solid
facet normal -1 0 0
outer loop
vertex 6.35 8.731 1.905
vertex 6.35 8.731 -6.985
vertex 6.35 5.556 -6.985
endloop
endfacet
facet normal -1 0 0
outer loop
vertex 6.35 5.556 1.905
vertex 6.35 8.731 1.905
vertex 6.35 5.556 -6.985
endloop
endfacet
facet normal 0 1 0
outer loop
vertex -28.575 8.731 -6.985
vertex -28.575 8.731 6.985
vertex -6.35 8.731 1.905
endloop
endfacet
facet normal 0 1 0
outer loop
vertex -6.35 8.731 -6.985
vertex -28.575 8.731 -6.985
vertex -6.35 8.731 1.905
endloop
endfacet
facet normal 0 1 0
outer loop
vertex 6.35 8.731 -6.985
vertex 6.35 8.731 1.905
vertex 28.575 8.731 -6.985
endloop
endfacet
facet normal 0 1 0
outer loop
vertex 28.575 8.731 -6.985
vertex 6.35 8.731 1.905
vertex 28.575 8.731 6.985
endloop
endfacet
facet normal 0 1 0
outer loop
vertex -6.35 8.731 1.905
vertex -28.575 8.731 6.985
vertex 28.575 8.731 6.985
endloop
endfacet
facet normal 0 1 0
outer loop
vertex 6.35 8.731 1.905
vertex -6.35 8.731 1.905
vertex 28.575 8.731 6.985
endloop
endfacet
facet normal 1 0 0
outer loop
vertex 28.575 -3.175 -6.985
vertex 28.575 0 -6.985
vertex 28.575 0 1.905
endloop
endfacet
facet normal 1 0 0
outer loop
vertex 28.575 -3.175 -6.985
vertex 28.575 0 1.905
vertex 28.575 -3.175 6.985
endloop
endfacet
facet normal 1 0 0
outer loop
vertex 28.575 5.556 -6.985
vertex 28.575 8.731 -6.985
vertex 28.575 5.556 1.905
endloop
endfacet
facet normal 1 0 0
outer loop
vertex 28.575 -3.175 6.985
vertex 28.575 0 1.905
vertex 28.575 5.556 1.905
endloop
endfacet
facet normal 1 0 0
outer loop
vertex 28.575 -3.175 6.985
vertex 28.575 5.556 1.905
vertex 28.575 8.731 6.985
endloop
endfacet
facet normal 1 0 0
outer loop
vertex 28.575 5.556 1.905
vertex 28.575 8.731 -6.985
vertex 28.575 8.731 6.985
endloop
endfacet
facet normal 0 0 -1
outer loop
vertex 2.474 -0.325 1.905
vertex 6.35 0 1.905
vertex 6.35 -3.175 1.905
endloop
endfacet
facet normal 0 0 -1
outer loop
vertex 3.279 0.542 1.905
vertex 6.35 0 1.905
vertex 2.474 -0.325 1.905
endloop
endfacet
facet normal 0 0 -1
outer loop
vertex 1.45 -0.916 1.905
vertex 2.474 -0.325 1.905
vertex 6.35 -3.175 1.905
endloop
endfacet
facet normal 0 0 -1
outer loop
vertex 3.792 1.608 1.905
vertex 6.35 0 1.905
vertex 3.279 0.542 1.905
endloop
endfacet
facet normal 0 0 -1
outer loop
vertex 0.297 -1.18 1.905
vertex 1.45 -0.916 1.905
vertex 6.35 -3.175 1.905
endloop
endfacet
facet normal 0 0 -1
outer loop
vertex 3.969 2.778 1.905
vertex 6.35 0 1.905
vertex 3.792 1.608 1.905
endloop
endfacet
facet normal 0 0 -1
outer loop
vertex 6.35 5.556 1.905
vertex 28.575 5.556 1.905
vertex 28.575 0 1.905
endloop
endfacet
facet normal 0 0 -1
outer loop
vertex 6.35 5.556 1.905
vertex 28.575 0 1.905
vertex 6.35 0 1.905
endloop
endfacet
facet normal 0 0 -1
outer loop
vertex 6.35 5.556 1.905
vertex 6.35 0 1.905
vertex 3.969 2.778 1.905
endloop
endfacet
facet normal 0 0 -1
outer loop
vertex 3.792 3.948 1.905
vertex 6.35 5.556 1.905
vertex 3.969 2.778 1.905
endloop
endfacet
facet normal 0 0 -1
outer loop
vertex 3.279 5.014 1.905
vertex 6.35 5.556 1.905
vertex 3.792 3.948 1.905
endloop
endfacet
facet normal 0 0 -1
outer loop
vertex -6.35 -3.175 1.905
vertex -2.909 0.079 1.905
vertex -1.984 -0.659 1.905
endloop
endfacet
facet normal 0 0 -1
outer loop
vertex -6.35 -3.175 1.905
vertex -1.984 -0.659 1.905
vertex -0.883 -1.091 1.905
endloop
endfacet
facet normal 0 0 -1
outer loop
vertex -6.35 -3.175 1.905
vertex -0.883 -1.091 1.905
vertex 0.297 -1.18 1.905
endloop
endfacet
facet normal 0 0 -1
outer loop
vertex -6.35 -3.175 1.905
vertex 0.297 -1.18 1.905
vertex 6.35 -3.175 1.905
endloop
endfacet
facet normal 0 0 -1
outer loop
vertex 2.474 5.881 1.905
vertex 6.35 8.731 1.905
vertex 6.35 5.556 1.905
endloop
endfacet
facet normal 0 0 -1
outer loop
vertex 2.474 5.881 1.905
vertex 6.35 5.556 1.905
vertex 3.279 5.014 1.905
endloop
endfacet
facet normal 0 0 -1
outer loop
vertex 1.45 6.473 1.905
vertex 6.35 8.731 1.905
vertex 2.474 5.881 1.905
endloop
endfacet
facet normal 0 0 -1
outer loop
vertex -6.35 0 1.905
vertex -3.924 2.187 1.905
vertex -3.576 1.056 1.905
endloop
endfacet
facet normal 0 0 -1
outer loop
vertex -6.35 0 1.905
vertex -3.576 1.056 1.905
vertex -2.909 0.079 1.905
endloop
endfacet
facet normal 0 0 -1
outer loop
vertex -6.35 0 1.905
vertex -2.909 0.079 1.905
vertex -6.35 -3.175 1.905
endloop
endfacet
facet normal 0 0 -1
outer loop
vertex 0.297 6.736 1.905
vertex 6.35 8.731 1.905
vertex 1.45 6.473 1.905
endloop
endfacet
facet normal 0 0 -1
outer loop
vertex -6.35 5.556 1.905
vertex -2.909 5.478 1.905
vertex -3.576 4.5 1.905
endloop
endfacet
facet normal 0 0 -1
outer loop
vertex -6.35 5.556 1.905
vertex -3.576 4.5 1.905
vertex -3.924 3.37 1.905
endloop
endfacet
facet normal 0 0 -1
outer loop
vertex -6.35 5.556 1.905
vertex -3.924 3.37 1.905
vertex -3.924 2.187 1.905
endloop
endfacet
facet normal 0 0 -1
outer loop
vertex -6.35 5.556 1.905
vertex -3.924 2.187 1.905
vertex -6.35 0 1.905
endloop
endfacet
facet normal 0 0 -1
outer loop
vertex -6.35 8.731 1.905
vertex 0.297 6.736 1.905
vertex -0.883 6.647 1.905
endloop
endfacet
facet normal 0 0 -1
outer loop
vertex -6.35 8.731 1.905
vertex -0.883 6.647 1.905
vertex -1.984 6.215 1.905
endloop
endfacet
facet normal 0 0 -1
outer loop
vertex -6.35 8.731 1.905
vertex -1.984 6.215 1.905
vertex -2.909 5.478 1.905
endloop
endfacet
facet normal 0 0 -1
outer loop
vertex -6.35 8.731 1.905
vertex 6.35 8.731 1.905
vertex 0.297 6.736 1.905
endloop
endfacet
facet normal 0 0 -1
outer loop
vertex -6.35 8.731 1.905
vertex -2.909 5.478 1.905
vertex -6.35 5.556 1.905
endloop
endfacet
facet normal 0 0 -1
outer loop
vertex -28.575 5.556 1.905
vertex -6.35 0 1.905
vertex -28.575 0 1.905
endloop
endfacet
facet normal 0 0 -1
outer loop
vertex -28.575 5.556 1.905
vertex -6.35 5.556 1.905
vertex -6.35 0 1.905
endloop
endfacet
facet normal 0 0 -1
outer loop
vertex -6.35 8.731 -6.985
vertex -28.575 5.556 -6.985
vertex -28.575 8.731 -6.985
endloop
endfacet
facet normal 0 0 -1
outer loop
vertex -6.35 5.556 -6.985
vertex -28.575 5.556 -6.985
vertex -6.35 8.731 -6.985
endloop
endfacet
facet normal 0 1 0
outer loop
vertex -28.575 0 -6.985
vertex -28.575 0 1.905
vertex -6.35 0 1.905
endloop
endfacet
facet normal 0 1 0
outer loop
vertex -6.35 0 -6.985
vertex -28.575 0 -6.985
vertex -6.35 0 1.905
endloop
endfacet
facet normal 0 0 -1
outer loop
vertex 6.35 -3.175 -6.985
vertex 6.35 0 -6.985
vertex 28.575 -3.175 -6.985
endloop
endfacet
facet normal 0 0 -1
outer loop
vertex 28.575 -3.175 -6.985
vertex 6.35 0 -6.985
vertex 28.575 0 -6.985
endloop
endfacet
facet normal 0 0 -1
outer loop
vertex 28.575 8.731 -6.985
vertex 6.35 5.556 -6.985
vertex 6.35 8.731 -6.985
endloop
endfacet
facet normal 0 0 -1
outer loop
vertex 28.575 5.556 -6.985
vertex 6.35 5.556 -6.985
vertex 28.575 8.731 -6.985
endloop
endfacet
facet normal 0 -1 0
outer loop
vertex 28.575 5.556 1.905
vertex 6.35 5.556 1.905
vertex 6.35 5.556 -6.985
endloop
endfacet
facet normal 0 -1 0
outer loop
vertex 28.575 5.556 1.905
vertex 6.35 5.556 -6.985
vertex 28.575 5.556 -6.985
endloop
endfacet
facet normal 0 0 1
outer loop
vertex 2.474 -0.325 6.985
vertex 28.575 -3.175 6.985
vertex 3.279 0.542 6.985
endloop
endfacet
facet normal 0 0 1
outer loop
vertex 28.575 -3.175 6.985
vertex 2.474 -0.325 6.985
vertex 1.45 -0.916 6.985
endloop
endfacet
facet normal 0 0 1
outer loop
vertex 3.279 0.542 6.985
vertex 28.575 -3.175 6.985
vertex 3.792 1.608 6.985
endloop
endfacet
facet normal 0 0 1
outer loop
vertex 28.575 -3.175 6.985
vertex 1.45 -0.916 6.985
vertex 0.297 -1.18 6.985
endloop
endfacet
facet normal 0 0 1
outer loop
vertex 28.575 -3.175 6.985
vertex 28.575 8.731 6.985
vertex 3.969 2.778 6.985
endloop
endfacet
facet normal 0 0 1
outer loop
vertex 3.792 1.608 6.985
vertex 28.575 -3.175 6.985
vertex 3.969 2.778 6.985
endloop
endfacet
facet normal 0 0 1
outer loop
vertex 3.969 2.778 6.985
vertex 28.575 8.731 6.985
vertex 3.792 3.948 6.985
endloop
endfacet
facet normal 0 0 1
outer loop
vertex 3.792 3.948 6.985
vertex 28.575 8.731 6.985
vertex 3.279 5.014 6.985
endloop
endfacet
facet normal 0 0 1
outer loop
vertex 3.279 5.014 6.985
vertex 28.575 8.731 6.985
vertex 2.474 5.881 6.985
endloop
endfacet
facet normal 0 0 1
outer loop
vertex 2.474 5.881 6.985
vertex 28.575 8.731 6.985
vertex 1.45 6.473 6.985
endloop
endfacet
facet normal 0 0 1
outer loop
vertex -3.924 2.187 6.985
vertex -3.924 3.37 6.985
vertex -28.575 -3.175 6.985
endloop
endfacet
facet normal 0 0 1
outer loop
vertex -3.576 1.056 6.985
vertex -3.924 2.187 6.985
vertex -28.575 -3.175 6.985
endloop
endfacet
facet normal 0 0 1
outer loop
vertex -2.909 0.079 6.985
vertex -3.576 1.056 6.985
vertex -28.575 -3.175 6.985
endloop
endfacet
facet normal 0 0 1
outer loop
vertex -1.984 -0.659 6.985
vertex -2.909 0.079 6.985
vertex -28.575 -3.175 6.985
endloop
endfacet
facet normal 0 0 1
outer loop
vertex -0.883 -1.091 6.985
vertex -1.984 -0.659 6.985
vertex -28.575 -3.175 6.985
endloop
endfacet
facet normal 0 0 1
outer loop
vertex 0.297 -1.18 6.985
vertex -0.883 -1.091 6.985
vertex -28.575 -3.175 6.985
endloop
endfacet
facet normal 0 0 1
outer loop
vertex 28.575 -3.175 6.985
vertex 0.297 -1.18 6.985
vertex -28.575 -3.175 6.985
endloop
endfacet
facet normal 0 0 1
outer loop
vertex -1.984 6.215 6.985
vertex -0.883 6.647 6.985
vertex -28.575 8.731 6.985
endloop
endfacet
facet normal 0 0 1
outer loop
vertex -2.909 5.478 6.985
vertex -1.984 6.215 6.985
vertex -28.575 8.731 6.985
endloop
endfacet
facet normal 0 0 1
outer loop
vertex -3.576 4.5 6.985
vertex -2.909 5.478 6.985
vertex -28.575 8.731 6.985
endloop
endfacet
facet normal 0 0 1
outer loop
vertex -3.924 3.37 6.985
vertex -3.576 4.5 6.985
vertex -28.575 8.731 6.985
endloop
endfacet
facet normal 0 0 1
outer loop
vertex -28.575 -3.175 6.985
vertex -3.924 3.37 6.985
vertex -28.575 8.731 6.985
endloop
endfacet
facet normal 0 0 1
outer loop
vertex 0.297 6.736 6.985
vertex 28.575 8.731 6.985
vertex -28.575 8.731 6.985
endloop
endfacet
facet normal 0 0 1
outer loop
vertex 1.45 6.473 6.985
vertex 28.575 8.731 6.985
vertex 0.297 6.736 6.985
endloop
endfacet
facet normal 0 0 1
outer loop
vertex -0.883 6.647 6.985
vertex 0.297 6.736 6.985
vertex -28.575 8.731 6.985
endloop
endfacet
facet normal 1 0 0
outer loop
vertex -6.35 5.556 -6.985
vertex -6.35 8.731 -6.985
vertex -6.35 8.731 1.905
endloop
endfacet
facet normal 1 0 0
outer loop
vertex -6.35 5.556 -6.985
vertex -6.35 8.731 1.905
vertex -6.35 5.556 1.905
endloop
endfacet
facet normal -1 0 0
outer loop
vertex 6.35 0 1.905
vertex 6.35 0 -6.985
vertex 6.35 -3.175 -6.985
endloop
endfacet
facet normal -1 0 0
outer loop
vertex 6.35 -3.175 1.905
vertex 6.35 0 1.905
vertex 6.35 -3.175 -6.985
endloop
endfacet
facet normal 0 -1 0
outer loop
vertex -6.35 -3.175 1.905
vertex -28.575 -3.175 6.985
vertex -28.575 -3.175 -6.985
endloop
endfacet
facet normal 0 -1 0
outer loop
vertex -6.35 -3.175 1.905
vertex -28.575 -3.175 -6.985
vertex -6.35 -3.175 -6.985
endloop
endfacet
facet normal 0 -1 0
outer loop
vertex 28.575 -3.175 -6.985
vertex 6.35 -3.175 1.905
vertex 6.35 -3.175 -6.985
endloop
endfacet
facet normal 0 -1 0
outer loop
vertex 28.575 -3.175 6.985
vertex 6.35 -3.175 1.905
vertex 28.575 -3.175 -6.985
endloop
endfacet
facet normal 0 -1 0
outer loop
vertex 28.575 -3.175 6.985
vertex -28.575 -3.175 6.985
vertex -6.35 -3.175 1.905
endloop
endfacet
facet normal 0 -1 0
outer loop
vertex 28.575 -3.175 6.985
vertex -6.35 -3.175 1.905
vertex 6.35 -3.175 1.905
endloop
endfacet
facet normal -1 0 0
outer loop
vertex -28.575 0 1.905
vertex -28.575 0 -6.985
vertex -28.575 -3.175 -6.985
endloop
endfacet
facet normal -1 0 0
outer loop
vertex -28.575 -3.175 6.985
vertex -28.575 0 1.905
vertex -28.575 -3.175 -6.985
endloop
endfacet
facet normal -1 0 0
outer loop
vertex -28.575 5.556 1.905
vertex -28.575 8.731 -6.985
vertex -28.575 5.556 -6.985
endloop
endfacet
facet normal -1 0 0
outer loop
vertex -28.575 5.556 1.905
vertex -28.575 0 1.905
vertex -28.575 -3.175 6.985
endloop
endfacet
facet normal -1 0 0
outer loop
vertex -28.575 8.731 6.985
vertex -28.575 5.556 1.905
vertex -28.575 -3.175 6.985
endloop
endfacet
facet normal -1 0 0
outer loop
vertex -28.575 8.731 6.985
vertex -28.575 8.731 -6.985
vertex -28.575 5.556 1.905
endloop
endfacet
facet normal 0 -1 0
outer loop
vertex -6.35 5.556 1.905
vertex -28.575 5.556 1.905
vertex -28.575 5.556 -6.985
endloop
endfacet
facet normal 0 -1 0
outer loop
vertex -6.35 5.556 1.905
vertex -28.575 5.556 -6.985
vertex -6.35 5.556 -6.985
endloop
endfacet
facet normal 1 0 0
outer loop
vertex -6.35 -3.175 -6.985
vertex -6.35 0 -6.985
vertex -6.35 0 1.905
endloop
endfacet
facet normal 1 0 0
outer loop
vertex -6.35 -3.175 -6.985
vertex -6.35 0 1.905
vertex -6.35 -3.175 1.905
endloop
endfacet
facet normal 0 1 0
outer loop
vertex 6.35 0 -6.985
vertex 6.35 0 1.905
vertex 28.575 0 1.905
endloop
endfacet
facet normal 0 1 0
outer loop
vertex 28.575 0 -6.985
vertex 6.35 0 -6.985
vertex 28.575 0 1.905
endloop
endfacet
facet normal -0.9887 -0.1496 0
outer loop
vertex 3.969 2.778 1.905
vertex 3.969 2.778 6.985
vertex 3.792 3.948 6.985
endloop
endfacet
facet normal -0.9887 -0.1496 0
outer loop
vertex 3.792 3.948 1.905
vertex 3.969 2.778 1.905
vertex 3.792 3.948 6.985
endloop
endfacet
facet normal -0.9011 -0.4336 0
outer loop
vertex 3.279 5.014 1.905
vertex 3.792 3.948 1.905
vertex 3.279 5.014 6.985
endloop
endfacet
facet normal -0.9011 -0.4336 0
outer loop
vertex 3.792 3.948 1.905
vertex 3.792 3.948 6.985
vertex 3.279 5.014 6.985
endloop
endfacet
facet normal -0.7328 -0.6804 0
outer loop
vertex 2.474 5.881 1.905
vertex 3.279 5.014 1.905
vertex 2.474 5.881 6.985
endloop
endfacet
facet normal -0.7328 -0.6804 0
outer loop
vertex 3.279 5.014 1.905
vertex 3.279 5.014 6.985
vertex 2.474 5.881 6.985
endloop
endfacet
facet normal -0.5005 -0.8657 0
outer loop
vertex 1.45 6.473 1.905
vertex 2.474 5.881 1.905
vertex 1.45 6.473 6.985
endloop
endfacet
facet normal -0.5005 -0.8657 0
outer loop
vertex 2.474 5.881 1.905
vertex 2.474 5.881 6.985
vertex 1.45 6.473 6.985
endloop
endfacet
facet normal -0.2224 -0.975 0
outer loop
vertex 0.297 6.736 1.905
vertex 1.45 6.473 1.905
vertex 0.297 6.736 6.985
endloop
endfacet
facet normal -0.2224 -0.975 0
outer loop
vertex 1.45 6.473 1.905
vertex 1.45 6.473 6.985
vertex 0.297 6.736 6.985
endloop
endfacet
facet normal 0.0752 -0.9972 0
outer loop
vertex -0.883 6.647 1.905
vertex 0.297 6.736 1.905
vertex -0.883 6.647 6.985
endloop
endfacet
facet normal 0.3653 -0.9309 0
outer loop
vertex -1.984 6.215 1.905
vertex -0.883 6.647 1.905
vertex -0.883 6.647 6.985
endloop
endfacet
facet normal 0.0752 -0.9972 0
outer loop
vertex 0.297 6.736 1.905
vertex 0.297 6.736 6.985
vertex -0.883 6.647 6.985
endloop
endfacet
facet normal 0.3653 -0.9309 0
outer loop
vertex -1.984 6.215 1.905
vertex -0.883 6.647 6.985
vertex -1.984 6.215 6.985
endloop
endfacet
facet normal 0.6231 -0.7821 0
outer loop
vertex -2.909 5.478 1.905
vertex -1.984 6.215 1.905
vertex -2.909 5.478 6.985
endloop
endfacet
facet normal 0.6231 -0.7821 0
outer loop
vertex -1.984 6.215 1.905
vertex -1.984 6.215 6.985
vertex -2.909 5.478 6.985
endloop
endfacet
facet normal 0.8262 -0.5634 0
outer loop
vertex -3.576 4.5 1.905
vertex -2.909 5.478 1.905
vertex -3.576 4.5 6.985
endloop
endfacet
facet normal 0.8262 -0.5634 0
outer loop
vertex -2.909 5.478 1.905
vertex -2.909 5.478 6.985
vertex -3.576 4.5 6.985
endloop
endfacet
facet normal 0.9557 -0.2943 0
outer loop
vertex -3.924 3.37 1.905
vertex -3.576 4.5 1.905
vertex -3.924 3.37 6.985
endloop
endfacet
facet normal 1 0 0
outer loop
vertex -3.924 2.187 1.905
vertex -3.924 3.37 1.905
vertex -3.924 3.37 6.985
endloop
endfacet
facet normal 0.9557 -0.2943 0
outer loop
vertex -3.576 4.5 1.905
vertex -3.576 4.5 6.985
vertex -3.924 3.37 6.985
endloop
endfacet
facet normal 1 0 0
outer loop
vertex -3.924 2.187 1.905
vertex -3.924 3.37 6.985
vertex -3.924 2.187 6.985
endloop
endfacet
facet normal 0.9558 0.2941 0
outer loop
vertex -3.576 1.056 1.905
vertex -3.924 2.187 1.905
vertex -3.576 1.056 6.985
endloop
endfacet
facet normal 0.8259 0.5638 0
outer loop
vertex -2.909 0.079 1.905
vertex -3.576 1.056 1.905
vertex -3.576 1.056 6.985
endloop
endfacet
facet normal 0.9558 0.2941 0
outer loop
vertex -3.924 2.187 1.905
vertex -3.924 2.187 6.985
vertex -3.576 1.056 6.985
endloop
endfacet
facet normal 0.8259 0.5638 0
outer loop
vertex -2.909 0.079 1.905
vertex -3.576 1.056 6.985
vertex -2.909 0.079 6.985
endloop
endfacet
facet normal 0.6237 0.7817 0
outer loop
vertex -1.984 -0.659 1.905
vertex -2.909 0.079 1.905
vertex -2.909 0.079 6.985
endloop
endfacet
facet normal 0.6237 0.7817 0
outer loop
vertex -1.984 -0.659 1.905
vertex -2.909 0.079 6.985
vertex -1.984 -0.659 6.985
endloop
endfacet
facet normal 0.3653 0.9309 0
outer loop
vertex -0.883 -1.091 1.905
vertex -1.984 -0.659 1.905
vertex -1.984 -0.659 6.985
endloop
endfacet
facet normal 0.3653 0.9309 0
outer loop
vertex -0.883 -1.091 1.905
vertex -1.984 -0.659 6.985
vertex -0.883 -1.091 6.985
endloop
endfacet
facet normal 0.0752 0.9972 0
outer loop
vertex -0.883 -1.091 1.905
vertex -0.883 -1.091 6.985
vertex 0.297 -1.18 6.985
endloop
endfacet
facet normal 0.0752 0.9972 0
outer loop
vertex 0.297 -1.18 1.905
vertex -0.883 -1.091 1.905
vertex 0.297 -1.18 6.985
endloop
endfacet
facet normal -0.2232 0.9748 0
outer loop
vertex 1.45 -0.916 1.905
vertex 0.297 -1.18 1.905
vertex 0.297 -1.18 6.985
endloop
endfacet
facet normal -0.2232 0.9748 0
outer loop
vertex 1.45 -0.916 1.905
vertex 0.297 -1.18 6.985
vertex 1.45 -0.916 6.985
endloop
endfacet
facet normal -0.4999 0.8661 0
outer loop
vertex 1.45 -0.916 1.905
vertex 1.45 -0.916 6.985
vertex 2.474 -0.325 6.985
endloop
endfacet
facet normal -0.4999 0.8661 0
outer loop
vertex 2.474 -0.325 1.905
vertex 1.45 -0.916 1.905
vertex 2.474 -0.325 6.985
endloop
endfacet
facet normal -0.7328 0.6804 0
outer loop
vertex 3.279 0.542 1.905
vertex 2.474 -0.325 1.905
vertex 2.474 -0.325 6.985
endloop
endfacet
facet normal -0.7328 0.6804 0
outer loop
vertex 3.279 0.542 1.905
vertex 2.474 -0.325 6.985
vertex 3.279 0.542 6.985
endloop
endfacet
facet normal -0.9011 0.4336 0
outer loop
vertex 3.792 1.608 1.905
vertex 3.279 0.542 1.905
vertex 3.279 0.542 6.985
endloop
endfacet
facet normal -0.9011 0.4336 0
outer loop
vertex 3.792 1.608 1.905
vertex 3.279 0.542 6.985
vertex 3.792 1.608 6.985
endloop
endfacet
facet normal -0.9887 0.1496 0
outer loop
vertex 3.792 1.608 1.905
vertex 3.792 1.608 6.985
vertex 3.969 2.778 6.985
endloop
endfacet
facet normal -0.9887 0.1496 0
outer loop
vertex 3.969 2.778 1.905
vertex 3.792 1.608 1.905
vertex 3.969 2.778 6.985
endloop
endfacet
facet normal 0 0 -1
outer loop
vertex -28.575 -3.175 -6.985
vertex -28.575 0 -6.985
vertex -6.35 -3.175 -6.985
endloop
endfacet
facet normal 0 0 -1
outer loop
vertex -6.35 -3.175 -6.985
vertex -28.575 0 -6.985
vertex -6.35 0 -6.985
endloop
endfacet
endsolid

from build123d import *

# Parameters (mm, degrees)
F0_W     = 57.15
F0_H     = 13.97
F1_DEPTH = 3.175
F2_W     = 57.15
F2_H     = 5.08
F3_DEPTH = 2.778125
F5_R     = 3.96875
F6_DEPTH = 13.971
F7_W     = 12.7
F7_H     = 11.90625
F8_DEPTH = 8.89


with BuildPart() as f1:
    # F0 (on Front) → F1 (new body)
    with BuildSketch(Plane.XZ):
        Rectangle(F0_W, F0_H)
    extrude(amount=F1_DEPTH)

    # F2 (on face) → F3 (join)
    with BuildSketch(Plane(origin=(0, 0, 0), x_dir=(-1, 0, 0), z_dir=(0, 1, 0))):
        with Locations((0, 4.445)):
            Rectangle(F2_W, F2_H)
    extrude(amount=F3_DEPTH)

    # F4: F1 across face


with BuildPart() as f1_1:
    add(f1.part)
    add(f1.part.mirror(Plane(origin=(0, 2.778125, 4.445), x_dir=(-1, 0, 0), z_dir=(0, 1, 0))))

    # F5 (on face) → F6 (cut, through all)
    with BuildSketch(Plane.XY.offset(6.985)):
        with Locations((0, 2.778125)):
            Circle(F5_R)
    extrude(amount=-F6_DEPTH, mode=Mode.SUBTRACT)

    # F7 (on face) → F8 (cut)
    with BuildSketch(Plane(origin=(0, 0, -6.985), x_dir=(1, 0, 0), z_dir=(0, 0, -1))):
        with Locations((0, -2.778125)):
            Rectangle(F7_W, F7_H)
    extrude(amount=-F8_DEPTH, mode=Mode.SUBTRACT)


solid = f1_1.part
